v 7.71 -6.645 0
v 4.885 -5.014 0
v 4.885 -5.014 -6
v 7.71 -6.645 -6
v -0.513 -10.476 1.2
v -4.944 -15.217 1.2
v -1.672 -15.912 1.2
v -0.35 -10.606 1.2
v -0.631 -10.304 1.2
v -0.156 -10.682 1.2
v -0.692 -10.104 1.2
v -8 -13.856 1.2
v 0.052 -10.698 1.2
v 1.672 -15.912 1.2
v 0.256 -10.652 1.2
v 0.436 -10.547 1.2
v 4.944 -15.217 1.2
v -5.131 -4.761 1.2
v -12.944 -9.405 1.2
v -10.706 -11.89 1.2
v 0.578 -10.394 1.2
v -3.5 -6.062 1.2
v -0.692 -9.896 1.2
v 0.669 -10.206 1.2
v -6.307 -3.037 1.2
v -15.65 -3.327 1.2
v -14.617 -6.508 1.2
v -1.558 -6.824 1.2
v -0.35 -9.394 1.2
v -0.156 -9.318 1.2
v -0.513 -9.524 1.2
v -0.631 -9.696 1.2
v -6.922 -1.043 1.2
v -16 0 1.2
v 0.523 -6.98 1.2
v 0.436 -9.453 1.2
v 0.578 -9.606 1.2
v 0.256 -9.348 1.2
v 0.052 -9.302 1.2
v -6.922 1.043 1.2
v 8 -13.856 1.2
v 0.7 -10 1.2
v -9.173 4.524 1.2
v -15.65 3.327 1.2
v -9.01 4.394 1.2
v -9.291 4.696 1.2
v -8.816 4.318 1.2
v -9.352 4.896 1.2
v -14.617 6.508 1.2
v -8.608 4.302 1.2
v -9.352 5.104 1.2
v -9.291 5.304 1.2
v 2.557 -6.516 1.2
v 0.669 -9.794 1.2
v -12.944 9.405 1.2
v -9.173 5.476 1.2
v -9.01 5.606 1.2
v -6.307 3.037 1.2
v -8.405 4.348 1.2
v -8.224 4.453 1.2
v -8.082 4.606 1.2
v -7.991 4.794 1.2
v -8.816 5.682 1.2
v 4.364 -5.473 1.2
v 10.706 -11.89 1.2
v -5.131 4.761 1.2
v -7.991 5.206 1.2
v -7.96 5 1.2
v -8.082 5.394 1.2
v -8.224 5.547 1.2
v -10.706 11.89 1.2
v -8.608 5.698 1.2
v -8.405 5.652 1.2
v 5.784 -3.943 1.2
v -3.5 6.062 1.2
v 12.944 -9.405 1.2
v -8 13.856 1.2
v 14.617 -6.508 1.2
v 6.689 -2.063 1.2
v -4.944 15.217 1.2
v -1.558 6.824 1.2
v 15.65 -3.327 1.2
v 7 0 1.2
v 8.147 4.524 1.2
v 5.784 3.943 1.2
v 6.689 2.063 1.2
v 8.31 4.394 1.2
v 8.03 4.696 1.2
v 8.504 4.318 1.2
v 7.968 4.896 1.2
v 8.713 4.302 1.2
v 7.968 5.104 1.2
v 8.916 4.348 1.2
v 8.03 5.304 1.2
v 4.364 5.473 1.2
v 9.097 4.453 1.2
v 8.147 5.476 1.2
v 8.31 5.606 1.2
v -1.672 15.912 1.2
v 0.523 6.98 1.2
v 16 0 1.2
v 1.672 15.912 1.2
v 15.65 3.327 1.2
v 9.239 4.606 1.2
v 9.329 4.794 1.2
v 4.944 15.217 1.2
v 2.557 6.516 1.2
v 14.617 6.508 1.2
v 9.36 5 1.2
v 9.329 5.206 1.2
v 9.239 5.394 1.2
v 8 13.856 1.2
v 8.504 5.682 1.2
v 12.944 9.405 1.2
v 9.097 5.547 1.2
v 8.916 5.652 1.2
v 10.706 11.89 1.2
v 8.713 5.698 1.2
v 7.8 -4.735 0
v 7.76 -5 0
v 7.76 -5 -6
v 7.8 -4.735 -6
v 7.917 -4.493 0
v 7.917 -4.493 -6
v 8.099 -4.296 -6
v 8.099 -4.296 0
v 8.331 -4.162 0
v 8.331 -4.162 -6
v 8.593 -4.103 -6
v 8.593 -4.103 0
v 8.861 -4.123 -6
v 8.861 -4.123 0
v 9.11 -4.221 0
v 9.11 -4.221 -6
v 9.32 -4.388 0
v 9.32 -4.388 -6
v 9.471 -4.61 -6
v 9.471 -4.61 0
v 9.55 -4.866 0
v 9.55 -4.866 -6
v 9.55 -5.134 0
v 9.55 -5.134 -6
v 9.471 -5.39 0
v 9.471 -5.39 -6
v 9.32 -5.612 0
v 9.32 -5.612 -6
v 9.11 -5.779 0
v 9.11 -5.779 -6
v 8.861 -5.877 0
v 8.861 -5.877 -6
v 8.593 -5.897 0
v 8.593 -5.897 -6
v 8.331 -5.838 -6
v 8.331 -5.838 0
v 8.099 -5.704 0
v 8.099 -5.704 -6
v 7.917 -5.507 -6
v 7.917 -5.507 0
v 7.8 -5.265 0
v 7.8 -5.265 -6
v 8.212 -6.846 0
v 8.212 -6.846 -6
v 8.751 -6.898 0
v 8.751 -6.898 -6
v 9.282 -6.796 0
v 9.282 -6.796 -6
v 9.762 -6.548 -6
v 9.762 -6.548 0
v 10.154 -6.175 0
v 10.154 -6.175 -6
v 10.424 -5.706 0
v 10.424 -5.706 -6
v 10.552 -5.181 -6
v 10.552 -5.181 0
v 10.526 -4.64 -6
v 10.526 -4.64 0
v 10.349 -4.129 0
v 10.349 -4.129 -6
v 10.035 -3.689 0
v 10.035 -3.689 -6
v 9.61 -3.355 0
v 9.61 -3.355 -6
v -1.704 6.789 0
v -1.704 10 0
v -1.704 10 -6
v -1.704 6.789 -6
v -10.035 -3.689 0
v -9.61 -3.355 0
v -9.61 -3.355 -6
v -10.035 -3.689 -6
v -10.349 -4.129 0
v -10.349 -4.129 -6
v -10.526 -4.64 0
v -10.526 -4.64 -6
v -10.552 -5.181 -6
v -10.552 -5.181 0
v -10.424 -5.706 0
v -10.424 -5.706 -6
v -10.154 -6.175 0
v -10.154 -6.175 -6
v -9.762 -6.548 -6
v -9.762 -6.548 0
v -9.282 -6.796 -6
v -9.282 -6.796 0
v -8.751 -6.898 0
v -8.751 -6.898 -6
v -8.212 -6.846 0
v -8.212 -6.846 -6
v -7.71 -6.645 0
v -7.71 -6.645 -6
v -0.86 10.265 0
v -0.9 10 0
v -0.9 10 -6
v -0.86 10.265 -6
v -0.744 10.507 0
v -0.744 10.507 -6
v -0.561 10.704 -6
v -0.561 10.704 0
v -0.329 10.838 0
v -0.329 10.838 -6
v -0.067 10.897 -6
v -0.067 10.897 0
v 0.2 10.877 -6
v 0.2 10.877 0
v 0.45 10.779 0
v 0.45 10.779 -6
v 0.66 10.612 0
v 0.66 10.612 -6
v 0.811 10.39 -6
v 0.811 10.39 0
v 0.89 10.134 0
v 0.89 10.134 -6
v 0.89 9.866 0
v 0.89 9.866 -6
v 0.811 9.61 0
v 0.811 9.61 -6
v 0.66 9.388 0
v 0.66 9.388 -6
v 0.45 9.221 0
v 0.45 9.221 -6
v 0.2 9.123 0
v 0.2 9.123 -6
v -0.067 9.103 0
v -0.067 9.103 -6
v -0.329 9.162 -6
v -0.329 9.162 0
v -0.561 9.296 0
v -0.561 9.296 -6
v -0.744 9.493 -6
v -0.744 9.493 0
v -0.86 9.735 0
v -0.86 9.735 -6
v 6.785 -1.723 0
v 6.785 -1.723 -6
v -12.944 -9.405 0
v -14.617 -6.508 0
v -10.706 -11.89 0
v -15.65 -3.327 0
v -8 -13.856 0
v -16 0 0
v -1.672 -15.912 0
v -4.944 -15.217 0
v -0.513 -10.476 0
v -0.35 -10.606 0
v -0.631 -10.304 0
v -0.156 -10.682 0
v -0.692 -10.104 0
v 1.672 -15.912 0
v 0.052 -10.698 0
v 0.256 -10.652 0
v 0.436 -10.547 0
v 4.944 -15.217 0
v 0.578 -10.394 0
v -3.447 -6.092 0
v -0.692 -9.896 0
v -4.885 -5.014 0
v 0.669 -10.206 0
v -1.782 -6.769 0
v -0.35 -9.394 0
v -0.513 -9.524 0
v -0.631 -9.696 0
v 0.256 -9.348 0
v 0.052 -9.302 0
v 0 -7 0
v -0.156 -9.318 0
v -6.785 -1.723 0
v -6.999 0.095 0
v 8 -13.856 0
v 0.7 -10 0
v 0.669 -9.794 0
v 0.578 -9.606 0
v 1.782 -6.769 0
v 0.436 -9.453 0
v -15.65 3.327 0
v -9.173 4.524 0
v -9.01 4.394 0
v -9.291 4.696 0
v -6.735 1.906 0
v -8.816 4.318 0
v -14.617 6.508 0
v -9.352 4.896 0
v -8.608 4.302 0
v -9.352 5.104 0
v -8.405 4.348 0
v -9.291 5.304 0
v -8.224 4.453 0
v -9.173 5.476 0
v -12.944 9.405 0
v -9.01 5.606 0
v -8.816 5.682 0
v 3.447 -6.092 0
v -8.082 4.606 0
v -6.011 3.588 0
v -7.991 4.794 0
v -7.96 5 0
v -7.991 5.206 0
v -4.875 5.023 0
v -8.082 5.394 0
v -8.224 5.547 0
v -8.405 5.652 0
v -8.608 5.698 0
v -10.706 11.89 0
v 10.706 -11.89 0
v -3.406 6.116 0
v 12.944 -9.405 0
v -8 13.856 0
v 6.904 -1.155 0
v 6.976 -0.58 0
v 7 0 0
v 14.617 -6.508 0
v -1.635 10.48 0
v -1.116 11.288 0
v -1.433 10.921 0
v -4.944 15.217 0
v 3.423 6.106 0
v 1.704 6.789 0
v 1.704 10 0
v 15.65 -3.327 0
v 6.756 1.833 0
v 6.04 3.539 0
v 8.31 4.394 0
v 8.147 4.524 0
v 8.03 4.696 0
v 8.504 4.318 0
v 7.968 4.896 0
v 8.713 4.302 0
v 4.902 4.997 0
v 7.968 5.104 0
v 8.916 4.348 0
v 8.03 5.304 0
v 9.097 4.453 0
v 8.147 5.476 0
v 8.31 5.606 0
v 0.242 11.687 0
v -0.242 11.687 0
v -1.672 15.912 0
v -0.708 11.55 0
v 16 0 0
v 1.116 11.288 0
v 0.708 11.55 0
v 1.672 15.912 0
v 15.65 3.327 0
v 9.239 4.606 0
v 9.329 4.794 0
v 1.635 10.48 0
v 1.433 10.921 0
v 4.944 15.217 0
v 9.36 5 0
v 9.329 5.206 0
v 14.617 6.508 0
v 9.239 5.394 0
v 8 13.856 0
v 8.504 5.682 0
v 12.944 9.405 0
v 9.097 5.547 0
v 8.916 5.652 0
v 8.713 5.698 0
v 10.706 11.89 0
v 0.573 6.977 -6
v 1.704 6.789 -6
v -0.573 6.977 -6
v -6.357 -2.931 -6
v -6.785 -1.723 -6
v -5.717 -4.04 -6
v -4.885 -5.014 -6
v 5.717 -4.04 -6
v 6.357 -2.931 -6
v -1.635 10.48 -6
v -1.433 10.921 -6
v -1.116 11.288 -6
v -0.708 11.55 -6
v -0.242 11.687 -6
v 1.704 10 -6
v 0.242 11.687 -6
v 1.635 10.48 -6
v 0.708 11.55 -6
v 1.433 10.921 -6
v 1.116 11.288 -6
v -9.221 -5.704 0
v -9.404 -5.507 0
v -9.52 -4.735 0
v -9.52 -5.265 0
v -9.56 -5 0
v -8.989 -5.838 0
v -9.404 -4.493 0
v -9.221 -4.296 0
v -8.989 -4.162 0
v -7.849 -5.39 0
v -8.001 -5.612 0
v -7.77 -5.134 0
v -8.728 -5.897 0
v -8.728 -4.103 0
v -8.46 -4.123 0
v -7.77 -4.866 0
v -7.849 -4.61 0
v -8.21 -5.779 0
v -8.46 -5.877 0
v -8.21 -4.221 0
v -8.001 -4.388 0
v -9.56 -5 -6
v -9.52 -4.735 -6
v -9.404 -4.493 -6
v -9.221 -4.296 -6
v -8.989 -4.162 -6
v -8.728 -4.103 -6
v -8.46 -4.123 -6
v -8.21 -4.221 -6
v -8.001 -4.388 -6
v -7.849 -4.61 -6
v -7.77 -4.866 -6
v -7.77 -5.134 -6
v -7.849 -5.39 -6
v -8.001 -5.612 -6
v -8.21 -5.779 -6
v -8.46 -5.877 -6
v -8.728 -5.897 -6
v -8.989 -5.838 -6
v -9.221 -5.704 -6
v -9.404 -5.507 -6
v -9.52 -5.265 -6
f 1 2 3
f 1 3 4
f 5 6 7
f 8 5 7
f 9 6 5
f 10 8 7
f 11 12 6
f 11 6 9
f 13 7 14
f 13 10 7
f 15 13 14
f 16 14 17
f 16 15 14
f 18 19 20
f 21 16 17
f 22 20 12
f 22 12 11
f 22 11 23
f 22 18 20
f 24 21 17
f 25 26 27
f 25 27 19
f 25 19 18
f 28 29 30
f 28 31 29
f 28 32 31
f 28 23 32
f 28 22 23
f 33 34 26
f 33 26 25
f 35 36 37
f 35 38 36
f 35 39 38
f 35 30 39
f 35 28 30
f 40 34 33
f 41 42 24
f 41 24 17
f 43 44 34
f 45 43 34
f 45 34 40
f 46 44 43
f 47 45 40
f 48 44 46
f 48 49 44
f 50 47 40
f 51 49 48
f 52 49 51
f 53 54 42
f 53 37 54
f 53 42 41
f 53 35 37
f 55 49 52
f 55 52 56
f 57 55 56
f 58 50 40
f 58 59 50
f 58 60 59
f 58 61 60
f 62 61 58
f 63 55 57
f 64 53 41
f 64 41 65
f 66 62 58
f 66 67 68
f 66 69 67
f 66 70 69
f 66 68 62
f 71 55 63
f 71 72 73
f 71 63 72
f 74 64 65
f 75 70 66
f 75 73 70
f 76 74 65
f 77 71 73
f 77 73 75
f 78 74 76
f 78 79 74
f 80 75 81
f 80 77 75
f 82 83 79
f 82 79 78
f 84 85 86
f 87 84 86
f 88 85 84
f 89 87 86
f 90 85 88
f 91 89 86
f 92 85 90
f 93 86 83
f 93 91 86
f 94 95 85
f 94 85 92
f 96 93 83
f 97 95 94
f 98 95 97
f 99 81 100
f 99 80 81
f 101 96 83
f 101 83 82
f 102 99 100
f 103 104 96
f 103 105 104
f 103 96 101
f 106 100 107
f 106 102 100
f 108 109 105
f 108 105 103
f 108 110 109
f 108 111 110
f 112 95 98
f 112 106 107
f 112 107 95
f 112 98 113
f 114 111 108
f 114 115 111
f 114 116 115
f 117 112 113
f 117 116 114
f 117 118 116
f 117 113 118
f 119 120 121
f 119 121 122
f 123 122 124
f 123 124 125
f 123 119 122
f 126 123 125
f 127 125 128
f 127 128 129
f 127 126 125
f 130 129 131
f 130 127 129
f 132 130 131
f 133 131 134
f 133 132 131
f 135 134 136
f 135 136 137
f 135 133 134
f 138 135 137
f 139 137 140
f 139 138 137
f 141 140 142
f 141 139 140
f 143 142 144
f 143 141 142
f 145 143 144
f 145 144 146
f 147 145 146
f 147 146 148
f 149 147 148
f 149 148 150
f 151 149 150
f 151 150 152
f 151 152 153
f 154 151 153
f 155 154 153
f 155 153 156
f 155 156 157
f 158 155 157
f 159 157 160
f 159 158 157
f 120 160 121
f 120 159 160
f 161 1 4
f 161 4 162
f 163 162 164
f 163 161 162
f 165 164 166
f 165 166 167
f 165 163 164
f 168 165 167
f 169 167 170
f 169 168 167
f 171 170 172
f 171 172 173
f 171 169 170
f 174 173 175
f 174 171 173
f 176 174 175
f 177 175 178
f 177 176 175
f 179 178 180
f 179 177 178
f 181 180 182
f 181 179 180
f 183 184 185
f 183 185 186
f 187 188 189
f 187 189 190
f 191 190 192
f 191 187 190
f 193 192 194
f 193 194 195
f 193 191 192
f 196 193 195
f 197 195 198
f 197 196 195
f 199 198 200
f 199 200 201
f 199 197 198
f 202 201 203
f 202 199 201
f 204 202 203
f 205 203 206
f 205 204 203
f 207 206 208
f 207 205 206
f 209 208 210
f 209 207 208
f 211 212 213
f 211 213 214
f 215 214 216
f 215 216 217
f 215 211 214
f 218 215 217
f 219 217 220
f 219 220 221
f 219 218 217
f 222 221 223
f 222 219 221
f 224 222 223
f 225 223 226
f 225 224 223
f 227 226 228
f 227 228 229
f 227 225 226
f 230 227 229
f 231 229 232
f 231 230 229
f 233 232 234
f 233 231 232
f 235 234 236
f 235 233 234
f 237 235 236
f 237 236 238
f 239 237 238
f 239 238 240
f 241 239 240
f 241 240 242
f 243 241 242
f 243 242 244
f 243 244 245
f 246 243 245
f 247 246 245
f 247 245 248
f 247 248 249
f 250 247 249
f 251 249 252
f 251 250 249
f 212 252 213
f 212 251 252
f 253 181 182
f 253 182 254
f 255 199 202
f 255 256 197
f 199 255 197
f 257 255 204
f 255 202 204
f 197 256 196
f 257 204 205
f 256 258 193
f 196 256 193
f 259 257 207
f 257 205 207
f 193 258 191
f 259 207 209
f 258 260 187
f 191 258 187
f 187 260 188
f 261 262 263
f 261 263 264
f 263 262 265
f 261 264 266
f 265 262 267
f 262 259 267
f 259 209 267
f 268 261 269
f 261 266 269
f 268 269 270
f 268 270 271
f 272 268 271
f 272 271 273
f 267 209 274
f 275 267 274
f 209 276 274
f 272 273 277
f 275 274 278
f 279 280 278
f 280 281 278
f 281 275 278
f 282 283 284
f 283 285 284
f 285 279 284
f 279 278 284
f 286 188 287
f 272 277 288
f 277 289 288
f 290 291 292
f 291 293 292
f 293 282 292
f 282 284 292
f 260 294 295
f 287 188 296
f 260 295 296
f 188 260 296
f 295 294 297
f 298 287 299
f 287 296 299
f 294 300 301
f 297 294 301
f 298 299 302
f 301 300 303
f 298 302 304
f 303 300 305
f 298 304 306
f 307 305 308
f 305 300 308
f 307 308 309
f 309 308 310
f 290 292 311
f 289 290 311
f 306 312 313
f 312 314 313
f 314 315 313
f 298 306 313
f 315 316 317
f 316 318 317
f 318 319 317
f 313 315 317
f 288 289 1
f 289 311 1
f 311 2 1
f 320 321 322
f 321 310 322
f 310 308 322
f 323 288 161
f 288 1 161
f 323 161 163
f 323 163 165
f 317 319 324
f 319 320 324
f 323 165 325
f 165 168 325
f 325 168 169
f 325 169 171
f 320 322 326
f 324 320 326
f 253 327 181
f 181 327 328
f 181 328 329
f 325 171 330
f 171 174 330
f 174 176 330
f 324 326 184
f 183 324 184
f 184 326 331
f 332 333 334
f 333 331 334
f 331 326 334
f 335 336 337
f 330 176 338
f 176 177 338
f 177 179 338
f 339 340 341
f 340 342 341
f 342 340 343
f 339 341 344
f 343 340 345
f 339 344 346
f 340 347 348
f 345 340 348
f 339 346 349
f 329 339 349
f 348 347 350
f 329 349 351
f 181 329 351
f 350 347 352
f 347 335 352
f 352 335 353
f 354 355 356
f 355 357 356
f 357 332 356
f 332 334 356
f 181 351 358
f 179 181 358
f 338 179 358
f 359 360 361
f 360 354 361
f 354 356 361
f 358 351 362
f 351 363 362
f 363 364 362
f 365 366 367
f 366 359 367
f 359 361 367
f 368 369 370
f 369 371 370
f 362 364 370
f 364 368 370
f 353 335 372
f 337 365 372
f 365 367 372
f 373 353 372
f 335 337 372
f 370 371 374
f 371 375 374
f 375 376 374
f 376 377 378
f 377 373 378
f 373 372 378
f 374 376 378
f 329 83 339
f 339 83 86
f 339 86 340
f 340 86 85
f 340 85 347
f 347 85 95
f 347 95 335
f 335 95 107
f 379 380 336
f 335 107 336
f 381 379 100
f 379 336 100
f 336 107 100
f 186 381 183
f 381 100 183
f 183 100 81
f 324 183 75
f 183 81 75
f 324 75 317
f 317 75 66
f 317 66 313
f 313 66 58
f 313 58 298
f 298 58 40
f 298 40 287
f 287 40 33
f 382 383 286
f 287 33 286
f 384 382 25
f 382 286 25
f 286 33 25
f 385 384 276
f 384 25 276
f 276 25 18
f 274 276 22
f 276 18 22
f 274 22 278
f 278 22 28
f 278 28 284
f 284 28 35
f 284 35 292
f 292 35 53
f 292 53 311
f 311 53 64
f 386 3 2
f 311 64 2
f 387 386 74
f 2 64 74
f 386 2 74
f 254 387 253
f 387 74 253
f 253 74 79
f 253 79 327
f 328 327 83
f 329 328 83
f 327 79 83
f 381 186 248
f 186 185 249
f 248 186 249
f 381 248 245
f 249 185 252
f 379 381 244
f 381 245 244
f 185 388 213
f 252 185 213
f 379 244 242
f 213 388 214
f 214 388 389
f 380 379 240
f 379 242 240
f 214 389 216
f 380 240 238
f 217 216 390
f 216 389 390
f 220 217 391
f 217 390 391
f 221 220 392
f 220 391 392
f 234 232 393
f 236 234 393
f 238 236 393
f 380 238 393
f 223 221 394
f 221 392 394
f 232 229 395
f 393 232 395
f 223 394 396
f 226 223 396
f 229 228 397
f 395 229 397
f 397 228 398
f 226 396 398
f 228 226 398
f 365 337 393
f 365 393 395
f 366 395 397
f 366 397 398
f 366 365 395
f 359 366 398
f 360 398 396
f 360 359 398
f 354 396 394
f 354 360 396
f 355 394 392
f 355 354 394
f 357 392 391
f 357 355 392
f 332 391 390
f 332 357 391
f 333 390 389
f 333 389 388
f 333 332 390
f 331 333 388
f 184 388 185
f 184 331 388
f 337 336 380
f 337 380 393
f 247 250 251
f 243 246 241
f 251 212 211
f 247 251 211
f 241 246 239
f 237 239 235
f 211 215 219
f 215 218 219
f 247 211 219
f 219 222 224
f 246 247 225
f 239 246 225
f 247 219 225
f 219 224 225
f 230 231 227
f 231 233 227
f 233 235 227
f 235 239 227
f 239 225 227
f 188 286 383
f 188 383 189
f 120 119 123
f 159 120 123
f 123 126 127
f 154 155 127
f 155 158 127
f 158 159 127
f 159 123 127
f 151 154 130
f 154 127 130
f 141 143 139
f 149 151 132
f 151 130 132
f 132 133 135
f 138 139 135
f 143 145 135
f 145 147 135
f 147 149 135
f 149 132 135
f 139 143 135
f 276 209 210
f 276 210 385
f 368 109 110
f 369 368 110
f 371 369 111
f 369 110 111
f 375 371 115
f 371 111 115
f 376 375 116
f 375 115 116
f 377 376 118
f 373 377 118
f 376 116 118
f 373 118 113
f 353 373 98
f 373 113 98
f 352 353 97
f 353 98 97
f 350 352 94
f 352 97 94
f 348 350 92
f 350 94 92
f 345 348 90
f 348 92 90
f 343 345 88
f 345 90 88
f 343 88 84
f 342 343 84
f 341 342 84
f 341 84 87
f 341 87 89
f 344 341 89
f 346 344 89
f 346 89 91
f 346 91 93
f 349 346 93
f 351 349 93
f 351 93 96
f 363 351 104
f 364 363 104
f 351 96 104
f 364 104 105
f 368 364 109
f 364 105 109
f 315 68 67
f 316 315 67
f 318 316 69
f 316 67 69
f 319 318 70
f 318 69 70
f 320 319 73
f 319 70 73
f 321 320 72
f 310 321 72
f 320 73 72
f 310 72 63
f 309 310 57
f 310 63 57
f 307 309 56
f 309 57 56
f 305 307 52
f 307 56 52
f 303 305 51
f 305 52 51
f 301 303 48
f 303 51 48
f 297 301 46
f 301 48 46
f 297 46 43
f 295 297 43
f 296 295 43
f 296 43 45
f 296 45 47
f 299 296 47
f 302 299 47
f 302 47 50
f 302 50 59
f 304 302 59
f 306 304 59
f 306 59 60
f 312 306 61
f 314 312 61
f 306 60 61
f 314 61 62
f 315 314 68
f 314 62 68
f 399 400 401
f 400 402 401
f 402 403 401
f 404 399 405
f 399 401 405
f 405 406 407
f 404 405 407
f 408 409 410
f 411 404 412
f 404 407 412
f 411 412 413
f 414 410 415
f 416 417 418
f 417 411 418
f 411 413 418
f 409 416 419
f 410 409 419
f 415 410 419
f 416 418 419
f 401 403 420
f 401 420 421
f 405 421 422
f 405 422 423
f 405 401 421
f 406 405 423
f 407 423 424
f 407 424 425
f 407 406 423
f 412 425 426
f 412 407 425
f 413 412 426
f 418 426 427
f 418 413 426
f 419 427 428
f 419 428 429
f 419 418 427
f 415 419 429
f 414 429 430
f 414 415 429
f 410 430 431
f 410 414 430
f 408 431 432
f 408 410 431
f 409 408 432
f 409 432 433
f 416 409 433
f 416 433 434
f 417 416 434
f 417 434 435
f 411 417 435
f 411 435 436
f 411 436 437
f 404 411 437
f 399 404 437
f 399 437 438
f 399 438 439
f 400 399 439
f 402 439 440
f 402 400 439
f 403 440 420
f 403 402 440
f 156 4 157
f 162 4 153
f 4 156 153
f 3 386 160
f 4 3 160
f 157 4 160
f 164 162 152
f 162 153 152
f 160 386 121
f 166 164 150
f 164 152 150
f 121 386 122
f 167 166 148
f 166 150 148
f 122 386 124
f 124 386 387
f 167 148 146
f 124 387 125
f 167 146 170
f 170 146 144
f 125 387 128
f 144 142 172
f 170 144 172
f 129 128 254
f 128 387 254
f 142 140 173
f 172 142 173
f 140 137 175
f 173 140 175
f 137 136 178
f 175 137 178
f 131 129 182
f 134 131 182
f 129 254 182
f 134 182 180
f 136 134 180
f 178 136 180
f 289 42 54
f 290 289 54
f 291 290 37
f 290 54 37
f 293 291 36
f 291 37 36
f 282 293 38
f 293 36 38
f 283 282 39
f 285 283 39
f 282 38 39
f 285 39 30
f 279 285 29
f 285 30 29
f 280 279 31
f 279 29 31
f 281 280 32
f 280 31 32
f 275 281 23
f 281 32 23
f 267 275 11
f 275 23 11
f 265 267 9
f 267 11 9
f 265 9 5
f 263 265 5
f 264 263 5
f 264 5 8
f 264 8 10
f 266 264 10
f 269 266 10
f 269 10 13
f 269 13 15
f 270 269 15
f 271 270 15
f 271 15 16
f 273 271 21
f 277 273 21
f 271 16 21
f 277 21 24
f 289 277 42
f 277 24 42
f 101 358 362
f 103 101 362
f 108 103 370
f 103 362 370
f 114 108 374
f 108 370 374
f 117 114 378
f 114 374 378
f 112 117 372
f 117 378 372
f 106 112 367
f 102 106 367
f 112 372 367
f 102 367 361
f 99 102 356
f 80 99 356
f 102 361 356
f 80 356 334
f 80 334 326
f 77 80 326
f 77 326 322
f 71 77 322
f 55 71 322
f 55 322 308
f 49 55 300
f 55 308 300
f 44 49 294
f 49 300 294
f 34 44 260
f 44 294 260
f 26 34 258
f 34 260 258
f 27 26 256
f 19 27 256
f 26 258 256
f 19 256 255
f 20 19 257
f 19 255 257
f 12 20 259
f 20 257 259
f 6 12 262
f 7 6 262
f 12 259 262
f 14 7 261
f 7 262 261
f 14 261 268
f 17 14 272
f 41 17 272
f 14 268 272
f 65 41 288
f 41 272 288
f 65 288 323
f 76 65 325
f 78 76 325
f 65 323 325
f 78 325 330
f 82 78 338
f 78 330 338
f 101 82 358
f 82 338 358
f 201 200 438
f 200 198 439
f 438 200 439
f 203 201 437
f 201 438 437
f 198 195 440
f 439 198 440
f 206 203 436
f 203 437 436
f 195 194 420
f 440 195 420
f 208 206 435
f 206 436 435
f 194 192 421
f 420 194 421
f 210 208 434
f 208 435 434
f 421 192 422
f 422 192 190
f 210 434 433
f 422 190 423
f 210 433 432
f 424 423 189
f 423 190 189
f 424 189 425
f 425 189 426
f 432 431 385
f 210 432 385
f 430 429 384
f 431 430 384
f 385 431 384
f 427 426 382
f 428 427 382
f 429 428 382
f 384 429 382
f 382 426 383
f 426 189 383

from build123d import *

# Parameters (mm, degrees)
SKETCH_1_R          = 16
EXTRUDE_1_DEPTH     = 1.2
SKETCH_2_R          = 7
CUT_EXTRUDE_1_DEPTH = 1.2
SKETCH_3_R          = 0.7
CUT_EXTRUDE_2_DEPTH = 1.2
SKETCH_4_R          = 0.9
EXTRUDE_2_DEPTH     = 6
SKETCH_5_R          = 7
CUT_EXTRUDE_3_DEPTH = 11


with BuildPart() as part:
    # 草图1 → 凸台-拉伸1 (new body)
    with BuildSketch(Plane.XY):
        Circle(SKETCH_1_R)
    extrude(amount=EXTRUDE_1_DEPTH)

    # 草图2 → 切除-拉伸1 (cut)
    with BuildSketch(Plane.XY.offset(1.2)):
        Circle(SKETCH_2_R)
    extrude(amount=-CUT_EXTRUDE_1_DEPTH, mode=Mode.SUBTRACT)

    # 草图3 → 切除-拉伸2 (cut)
    with BuildSketch(Plane.XY.offset(1.2)):
        with Locations((8.660254038, 5)):
            Circle(SKETCH_3_R)
        with Locations((0, -10)):
            Circle(SKETCH_3_R)
        with Locations((-8.660254038, 5)):
            Circle(SKETCH_3_R)
    extrude(amount=-CUT_EXTRUDE_2_DEPTH, mode=Mode.SUBTRACT)

    # 草图4 → 凸台-拉伸2 (add)
    with BuildSketch(Plane(origin=(0, 0, 0), x_dir=(-1, 0, 0), z_dir=(0, 0, -1))):
        with BuildLine():
            Line((1.703894623, 10), (1.703894623, 5.395195442))
            Line((1.703894623, 5.395195442), (-1.703894623, 5.395195442))
            Line((-1.703894623, 5.395195442), (-1.703894623, 10))
            ThreePointArc((-1.703894623, 10), (0, 11.703894623), (1.703894623, 10))
        make_face()
        with Locations((0, 10)):
            Circle(SKETCH_4_R, mode=Mode.SUBTRACT)
        with BuildLine():
            Line((-5.537946003, -1.003403593), (-3.637946003, -4.294300127))
            Line((-3.637946003, -4.294300127), (-7.710254038, -6.645448267))
            ThreePointArc((-7.710254038, -6.645448267), (-10.305702305, -5.95), (-9.610254038, -3.354551733))
            Line((-9.610254038, -3.354551733), (-5.537946003, -1.003403593))
        make_face()
        with Locations((-8.660254038, -5)):
            Circle(SKETCH_4_R, mode=Mode.SUBTRACT)
        with BuildLine():
            Line((3.637946003, -4.294300127), (5.537946003, -1.003403593))
            Line((5.537946003, -1.003403593), (9.610254038, -3.354551733))
            ThreePointArc((9.610254038, -3.354551733), (10.305702305, -5.95), (7.710254038, -6.645448267))
            Line((7.710254038, -6.645448267), (3.637946003, -4.294300127))
        make_face()
        with Locations((8.660254038, -5)):
            Circle(SKETCH_4_R, mode=Mode.SUBTRACT)
    extrude(amount=EXTRUDE_2_DEPTH)

    # 草图5 → 切除-拉伸3 (cut)
    with BuildSketch(Plane.XY.offset(1.2)):
        Circle(SKETCH_5_R)
    extrude(amount=-CUT_EXTRUDE_3_DEPTH, mode=Mode.SUBTRACT)


solid = part.part
